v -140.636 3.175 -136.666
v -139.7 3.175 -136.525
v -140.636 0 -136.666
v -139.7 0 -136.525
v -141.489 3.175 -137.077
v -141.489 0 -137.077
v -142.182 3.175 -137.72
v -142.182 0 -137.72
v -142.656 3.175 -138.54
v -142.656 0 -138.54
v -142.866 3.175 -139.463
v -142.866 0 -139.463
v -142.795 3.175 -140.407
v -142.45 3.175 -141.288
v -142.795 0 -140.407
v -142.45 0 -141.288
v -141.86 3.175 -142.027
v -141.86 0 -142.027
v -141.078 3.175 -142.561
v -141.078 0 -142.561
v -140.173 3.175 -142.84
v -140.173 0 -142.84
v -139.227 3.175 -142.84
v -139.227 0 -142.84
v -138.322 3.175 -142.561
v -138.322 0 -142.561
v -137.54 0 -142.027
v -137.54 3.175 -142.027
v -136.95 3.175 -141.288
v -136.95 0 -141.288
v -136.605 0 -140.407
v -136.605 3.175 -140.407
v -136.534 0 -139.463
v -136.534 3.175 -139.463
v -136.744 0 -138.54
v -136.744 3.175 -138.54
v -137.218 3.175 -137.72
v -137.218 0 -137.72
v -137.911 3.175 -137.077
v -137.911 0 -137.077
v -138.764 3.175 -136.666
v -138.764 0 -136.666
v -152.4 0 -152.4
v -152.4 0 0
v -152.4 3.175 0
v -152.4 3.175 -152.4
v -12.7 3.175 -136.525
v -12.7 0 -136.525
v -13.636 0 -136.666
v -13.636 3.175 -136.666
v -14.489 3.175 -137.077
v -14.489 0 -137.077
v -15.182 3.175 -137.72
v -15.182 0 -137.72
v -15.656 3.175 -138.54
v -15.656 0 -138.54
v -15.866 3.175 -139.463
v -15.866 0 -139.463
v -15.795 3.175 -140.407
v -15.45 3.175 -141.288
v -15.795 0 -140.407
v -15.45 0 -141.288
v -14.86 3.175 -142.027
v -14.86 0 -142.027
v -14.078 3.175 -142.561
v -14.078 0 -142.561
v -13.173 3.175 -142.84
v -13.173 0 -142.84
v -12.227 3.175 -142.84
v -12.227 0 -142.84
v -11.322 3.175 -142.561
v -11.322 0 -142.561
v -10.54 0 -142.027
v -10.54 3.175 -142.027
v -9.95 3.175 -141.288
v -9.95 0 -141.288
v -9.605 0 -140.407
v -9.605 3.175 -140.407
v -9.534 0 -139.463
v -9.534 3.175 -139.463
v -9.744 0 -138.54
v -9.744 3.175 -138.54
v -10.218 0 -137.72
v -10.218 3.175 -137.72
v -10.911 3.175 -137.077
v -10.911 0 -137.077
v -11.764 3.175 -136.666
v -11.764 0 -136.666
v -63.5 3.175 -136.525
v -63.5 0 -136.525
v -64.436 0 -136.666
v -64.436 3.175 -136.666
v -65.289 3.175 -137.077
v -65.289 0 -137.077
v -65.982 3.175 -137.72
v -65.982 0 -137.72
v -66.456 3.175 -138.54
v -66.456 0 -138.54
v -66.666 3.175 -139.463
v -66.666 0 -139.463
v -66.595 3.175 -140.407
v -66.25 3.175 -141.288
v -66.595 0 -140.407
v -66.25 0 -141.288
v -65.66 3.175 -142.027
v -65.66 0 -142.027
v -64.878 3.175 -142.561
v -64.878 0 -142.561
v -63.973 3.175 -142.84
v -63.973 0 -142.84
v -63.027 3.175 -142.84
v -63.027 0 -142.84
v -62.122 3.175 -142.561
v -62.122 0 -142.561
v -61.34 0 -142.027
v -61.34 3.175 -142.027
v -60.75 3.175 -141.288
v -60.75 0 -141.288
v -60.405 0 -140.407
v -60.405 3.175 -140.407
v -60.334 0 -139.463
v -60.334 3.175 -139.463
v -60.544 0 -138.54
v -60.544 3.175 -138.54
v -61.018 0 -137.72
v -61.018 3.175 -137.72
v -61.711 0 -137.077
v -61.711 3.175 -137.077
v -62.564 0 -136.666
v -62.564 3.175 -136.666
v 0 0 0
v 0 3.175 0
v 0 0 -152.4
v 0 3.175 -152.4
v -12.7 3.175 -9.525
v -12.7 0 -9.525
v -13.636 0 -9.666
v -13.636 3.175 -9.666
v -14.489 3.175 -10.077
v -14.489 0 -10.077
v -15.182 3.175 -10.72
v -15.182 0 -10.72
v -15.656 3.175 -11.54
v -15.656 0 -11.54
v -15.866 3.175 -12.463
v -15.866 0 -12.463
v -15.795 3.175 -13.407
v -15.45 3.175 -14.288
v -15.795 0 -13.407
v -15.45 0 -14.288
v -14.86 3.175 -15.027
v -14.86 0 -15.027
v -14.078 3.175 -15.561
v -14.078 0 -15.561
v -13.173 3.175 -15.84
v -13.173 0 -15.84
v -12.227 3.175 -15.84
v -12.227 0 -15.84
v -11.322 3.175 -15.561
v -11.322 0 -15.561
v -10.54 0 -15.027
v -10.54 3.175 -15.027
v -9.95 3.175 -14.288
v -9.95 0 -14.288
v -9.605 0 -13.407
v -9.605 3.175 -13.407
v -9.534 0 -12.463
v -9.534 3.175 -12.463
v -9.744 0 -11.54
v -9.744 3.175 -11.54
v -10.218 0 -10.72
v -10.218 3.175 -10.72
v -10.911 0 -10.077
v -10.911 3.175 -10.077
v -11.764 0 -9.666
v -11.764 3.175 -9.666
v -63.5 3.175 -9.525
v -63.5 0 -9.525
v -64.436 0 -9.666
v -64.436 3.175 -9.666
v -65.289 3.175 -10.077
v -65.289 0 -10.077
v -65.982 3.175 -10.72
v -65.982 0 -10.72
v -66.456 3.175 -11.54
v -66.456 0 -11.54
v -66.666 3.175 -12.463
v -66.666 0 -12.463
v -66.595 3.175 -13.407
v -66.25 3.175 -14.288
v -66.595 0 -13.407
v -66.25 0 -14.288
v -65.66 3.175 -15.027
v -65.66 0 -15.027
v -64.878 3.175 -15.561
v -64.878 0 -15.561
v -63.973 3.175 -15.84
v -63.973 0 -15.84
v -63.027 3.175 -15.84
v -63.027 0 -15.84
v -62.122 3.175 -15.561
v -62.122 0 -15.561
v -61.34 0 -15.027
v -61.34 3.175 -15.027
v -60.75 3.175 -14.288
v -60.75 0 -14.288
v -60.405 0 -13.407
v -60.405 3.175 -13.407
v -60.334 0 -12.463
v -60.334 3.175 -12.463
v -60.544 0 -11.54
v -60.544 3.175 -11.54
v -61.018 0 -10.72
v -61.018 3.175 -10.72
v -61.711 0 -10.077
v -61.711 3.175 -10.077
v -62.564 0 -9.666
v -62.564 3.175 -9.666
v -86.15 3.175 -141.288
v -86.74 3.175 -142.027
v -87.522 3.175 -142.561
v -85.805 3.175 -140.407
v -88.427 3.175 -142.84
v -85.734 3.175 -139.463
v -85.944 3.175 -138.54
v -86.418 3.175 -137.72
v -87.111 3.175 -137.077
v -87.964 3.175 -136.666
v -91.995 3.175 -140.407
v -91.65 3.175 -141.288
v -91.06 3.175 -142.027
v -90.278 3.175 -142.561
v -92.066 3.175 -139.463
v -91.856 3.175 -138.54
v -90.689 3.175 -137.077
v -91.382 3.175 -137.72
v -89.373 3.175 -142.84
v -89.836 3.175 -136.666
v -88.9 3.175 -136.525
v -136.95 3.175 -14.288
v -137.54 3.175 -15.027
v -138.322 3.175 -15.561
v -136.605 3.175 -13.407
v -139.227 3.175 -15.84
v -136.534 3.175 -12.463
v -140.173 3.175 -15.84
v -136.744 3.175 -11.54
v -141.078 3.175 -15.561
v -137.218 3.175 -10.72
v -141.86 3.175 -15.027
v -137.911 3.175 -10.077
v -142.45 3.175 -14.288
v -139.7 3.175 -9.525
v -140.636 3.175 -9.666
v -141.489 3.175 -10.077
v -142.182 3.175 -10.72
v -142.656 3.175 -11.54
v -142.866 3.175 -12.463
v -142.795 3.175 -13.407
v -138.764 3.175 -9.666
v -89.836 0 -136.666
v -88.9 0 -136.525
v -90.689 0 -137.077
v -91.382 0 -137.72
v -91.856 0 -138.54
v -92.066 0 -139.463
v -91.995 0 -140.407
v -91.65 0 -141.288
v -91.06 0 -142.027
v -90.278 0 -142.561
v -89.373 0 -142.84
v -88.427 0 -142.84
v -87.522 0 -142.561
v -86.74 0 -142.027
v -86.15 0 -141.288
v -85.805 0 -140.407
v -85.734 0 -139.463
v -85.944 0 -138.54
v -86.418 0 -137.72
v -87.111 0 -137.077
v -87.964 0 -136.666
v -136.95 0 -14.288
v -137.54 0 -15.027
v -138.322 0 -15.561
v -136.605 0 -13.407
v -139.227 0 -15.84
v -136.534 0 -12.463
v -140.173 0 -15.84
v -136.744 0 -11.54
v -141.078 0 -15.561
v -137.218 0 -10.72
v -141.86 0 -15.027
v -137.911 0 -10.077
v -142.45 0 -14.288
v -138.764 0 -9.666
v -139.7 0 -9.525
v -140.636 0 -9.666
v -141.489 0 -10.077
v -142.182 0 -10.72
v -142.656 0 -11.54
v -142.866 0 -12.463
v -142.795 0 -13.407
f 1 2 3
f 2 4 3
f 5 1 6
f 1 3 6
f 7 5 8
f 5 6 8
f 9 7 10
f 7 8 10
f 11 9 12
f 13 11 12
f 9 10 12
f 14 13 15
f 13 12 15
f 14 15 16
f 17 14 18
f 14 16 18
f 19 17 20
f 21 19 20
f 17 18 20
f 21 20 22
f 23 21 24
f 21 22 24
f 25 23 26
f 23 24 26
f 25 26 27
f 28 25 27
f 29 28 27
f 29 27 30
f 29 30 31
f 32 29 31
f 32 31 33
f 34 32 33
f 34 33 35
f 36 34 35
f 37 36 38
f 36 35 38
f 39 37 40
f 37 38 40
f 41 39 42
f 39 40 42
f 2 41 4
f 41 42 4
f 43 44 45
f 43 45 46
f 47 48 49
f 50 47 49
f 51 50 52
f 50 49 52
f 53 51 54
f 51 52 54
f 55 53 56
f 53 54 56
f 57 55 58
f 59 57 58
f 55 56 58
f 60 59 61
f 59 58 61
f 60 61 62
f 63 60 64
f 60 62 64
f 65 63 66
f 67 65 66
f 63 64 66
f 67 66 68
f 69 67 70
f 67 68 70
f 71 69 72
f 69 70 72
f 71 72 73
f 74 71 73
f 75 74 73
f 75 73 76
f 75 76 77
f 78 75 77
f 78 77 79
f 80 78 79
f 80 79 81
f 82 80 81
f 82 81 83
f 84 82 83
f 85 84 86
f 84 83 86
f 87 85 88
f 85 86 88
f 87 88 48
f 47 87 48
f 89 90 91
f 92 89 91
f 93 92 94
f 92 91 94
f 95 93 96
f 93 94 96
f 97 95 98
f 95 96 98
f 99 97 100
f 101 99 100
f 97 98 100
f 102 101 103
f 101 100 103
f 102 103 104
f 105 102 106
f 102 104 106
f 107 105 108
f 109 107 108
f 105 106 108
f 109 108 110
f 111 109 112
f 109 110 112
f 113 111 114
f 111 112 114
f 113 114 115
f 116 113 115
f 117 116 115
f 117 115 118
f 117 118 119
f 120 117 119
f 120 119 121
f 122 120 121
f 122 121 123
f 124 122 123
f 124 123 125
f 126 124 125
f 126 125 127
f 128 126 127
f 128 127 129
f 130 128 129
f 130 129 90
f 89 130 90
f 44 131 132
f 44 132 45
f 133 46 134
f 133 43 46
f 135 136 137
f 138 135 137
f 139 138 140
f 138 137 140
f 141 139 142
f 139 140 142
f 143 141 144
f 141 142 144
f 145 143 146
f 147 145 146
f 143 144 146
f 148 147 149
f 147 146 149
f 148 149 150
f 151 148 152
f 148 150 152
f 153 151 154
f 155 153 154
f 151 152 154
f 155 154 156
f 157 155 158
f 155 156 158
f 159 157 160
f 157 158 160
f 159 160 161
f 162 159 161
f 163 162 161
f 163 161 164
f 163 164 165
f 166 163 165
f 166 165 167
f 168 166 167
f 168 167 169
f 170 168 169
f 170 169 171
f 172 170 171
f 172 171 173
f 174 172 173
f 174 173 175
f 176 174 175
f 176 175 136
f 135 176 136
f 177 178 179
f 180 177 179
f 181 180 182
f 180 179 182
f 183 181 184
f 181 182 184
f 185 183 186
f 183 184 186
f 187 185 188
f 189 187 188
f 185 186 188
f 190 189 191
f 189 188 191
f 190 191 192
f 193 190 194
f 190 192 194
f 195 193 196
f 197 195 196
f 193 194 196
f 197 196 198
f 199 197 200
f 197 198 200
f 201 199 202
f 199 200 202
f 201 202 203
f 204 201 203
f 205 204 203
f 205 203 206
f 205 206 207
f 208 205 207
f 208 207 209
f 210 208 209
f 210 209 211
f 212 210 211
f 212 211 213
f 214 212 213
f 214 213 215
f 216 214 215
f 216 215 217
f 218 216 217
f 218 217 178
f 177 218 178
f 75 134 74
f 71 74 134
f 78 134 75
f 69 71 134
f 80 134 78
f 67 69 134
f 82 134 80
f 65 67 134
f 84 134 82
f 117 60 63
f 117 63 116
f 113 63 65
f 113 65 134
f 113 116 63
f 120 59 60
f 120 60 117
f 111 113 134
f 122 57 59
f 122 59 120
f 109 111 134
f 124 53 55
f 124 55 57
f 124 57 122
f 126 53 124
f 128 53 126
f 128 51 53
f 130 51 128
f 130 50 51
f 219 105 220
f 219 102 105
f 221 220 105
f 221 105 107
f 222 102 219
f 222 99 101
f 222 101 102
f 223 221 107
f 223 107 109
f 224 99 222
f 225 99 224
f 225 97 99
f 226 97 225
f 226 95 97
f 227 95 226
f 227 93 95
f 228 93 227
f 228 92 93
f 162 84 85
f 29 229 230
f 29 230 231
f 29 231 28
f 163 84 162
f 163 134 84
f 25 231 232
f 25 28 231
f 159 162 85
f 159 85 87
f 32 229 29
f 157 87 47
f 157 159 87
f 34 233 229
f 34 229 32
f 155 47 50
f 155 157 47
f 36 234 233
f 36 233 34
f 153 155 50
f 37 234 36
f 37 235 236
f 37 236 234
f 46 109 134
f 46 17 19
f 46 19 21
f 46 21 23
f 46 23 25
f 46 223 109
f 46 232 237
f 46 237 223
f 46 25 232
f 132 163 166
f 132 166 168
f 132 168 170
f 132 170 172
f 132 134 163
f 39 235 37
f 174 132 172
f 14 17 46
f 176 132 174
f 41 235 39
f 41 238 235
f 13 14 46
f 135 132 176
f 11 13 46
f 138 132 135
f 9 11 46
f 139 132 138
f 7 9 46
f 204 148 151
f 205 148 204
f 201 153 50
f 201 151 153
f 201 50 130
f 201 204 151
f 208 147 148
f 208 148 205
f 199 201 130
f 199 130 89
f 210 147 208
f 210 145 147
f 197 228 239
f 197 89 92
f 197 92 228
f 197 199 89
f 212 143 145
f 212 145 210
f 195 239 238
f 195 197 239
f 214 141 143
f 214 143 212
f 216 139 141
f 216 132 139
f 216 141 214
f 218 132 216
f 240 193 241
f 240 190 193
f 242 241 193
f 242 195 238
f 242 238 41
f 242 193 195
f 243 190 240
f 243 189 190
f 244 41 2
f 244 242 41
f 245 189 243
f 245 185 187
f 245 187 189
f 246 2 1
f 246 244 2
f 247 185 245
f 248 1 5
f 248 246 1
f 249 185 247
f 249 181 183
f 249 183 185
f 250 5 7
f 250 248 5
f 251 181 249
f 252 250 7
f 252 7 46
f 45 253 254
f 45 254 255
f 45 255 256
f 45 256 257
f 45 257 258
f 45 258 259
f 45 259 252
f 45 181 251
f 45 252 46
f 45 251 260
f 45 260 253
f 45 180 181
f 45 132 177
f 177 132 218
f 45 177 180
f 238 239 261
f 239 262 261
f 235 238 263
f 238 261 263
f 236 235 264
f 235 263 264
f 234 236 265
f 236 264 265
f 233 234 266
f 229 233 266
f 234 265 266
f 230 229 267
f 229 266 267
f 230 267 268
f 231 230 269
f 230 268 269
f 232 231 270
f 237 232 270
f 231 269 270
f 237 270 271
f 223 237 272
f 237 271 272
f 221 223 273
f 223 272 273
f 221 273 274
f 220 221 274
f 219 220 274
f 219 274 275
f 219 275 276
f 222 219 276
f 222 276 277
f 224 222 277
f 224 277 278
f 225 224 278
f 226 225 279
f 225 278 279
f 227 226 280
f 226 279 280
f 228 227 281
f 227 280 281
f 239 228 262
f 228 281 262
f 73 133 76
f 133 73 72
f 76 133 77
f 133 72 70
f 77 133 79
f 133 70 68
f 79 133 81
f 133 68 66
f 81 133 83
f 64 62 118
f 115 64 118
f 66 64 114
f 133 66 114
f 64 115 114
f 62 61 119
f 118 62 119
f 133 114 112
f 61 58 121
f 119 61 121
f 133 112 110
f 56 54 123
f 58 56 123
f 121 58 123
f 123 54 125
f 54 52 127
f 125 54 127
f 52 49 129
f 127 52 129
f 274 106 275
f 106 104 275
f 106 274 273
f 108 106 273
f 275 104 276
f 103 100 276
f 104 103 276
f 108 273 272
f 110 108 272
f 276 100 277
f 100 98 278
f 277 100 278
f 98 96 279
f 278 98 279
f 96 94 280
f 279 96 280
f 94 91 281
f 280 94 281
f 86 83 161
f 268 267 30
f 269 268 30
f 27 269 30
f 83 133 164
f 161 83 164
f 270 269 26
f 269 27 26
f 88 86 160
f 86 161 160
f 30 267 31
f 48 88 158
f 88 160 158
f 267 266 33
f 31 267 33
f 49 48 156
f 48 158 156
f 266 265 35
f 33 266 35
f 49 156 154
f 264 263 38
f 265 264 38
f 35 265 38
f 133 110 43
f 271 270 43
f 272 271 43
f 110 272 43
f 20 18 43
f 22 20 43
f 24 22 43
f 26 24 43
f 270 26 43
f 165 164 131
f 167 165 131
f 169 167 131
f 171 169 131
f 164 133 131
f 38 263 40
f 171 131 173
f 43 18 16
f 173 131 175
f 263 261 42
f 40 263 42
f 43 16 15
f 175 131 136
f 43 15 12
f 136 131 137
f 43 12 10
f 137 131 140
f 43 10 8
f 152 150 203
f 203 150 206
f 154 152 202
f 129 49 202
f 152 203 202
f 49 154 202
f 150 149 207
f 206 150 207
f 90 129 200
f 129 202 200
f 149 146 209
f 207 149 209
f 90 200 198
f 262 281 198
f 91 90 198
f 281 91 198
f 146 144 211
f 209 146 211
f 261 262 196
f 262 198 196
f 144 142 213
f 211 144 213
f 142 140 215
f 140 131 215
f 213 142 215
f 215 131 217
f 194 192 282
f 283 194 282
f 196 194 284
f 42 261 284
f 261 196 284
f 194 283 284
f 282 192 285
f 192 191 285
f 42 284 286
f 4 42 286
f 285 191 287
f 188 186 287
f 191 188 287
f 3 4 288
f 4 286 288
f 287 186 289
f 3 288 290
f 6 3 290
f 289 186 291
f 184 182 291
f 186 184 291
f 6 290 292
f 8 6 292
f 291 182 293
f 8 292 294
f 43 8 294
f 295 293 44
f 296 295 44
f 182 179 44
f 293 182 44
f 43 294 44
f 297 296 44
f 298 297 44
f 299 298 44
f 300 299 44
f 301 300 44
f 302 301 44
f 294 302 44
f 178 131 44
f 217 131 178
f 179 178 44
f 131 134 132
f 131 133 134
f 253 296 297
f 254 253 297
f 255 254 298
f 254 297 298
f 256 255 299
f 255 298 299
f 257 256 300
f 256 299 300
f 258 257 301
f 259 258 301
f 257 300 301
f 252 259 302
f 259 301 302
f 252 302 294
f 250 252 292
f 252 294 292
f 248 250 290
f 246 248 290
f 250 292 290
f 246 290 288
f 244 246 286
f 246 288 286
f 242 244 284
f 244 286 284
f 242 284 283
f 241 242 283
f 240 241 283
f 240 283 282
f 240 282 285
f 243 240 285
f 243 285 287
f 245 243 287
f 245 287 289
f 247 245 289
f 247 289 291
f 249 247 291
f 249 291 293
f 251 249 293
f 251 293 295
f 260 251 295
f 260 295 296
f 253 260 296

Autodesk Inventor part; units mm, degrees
ref_plane "YZ Plane" through (0, 0, 0) normal (1, 0, 0) x (0, 1, 0)
ref_plane "XZ Plane" through (0, 0, 0) normal (0, 1, 0) x (-1, 0, 0)
ref_plane "XY Plane" through (0, 0, 0) normal (0, 0, 1) x (1, 0, 0)
sketch "Sketch1" plane through (0, 0, 0) normal (0, 1, 0) x (-1, 0, 0)
  line L0 (0, 0) -> (152.4, 0)
  line L1 (152.4, 0) -> (152.4, -152.4)
  line L2 (152.4, -152.4) -> (0, -152.4)
  line L3 (0, -152.4) -> (0, 0)
  dimension "d0" = 152.4
  dimension "d1" = 152.4
extrude "Extrusion1" add sketch "Sketch1" along normal blind 3.175
sketch "Sketch2" plane through (0, 3.175, 0) normal (0, 1, 0) x (1, 0, 0)
  line L0 (-152.4, 0) -> (0, 0) projected
  line L1 (0, 0) -> (0, 152.4) projected
  line L2 (0, 152.4) -> (-152.4, 152.4) projected
  line L3 (-152.4, 152.4) -> (-152.4, 0) projected
  point P0 (-139.7, 12.7)
  point P1 (-63.5, 12.7)
  point P2 (-12.7, 12.7)
  point P3 (-12.7, 139.7)
  point P4 (-63.5, 139.7)
  point P5 (-139.7, 139.7)
  dimension "d4" = 12.7
  dimension "d5" = 12.7
  dimension "d6" = 12.7
  dimension "d7" = 12.7
  dimension "d8" = 12.7
  dimension "d9" = 12.7
  dimension "d10" = 12.7
  dimension "d11" = 63.5
  dimension "d12" = 12.7
  dimension "d13" = 12.7
  dimension "d14" = 12.7
  dimension "d15" = 63.5
hole "Hole1" at (-139.7, 3.175, -12.7) at (-63.5, 3.175, -12.7) at (-12.7, 3.175, -12.7) at (-12.7, 3.175, -139.7) at (-63.5, 3.175, -139.7) at (-139.7, 3.175, -139.7) direction (0, -1, 0) diameter 6.35 end through all
sketch "Sketch3" plane through (0, 3.175, 0) normal (0, 1, 0) x (1, 0, 0)
  circle A0 centre (-139.7, 139.7) radius 3.175 projected
  line L0 (0, 152.4) -> (-152.4, 152.4) projected
  point P0 (-88.9, 139.7)
  dimension "d23" = 12.7
  dimension "d24" = 50.8
hole "Hole2" at (-88.9, 3.175, -139.7) direction (0, -1, 0) diameter 6.35 end through all
properties part number "pickup arm plate" material "Aluminum 6061"
